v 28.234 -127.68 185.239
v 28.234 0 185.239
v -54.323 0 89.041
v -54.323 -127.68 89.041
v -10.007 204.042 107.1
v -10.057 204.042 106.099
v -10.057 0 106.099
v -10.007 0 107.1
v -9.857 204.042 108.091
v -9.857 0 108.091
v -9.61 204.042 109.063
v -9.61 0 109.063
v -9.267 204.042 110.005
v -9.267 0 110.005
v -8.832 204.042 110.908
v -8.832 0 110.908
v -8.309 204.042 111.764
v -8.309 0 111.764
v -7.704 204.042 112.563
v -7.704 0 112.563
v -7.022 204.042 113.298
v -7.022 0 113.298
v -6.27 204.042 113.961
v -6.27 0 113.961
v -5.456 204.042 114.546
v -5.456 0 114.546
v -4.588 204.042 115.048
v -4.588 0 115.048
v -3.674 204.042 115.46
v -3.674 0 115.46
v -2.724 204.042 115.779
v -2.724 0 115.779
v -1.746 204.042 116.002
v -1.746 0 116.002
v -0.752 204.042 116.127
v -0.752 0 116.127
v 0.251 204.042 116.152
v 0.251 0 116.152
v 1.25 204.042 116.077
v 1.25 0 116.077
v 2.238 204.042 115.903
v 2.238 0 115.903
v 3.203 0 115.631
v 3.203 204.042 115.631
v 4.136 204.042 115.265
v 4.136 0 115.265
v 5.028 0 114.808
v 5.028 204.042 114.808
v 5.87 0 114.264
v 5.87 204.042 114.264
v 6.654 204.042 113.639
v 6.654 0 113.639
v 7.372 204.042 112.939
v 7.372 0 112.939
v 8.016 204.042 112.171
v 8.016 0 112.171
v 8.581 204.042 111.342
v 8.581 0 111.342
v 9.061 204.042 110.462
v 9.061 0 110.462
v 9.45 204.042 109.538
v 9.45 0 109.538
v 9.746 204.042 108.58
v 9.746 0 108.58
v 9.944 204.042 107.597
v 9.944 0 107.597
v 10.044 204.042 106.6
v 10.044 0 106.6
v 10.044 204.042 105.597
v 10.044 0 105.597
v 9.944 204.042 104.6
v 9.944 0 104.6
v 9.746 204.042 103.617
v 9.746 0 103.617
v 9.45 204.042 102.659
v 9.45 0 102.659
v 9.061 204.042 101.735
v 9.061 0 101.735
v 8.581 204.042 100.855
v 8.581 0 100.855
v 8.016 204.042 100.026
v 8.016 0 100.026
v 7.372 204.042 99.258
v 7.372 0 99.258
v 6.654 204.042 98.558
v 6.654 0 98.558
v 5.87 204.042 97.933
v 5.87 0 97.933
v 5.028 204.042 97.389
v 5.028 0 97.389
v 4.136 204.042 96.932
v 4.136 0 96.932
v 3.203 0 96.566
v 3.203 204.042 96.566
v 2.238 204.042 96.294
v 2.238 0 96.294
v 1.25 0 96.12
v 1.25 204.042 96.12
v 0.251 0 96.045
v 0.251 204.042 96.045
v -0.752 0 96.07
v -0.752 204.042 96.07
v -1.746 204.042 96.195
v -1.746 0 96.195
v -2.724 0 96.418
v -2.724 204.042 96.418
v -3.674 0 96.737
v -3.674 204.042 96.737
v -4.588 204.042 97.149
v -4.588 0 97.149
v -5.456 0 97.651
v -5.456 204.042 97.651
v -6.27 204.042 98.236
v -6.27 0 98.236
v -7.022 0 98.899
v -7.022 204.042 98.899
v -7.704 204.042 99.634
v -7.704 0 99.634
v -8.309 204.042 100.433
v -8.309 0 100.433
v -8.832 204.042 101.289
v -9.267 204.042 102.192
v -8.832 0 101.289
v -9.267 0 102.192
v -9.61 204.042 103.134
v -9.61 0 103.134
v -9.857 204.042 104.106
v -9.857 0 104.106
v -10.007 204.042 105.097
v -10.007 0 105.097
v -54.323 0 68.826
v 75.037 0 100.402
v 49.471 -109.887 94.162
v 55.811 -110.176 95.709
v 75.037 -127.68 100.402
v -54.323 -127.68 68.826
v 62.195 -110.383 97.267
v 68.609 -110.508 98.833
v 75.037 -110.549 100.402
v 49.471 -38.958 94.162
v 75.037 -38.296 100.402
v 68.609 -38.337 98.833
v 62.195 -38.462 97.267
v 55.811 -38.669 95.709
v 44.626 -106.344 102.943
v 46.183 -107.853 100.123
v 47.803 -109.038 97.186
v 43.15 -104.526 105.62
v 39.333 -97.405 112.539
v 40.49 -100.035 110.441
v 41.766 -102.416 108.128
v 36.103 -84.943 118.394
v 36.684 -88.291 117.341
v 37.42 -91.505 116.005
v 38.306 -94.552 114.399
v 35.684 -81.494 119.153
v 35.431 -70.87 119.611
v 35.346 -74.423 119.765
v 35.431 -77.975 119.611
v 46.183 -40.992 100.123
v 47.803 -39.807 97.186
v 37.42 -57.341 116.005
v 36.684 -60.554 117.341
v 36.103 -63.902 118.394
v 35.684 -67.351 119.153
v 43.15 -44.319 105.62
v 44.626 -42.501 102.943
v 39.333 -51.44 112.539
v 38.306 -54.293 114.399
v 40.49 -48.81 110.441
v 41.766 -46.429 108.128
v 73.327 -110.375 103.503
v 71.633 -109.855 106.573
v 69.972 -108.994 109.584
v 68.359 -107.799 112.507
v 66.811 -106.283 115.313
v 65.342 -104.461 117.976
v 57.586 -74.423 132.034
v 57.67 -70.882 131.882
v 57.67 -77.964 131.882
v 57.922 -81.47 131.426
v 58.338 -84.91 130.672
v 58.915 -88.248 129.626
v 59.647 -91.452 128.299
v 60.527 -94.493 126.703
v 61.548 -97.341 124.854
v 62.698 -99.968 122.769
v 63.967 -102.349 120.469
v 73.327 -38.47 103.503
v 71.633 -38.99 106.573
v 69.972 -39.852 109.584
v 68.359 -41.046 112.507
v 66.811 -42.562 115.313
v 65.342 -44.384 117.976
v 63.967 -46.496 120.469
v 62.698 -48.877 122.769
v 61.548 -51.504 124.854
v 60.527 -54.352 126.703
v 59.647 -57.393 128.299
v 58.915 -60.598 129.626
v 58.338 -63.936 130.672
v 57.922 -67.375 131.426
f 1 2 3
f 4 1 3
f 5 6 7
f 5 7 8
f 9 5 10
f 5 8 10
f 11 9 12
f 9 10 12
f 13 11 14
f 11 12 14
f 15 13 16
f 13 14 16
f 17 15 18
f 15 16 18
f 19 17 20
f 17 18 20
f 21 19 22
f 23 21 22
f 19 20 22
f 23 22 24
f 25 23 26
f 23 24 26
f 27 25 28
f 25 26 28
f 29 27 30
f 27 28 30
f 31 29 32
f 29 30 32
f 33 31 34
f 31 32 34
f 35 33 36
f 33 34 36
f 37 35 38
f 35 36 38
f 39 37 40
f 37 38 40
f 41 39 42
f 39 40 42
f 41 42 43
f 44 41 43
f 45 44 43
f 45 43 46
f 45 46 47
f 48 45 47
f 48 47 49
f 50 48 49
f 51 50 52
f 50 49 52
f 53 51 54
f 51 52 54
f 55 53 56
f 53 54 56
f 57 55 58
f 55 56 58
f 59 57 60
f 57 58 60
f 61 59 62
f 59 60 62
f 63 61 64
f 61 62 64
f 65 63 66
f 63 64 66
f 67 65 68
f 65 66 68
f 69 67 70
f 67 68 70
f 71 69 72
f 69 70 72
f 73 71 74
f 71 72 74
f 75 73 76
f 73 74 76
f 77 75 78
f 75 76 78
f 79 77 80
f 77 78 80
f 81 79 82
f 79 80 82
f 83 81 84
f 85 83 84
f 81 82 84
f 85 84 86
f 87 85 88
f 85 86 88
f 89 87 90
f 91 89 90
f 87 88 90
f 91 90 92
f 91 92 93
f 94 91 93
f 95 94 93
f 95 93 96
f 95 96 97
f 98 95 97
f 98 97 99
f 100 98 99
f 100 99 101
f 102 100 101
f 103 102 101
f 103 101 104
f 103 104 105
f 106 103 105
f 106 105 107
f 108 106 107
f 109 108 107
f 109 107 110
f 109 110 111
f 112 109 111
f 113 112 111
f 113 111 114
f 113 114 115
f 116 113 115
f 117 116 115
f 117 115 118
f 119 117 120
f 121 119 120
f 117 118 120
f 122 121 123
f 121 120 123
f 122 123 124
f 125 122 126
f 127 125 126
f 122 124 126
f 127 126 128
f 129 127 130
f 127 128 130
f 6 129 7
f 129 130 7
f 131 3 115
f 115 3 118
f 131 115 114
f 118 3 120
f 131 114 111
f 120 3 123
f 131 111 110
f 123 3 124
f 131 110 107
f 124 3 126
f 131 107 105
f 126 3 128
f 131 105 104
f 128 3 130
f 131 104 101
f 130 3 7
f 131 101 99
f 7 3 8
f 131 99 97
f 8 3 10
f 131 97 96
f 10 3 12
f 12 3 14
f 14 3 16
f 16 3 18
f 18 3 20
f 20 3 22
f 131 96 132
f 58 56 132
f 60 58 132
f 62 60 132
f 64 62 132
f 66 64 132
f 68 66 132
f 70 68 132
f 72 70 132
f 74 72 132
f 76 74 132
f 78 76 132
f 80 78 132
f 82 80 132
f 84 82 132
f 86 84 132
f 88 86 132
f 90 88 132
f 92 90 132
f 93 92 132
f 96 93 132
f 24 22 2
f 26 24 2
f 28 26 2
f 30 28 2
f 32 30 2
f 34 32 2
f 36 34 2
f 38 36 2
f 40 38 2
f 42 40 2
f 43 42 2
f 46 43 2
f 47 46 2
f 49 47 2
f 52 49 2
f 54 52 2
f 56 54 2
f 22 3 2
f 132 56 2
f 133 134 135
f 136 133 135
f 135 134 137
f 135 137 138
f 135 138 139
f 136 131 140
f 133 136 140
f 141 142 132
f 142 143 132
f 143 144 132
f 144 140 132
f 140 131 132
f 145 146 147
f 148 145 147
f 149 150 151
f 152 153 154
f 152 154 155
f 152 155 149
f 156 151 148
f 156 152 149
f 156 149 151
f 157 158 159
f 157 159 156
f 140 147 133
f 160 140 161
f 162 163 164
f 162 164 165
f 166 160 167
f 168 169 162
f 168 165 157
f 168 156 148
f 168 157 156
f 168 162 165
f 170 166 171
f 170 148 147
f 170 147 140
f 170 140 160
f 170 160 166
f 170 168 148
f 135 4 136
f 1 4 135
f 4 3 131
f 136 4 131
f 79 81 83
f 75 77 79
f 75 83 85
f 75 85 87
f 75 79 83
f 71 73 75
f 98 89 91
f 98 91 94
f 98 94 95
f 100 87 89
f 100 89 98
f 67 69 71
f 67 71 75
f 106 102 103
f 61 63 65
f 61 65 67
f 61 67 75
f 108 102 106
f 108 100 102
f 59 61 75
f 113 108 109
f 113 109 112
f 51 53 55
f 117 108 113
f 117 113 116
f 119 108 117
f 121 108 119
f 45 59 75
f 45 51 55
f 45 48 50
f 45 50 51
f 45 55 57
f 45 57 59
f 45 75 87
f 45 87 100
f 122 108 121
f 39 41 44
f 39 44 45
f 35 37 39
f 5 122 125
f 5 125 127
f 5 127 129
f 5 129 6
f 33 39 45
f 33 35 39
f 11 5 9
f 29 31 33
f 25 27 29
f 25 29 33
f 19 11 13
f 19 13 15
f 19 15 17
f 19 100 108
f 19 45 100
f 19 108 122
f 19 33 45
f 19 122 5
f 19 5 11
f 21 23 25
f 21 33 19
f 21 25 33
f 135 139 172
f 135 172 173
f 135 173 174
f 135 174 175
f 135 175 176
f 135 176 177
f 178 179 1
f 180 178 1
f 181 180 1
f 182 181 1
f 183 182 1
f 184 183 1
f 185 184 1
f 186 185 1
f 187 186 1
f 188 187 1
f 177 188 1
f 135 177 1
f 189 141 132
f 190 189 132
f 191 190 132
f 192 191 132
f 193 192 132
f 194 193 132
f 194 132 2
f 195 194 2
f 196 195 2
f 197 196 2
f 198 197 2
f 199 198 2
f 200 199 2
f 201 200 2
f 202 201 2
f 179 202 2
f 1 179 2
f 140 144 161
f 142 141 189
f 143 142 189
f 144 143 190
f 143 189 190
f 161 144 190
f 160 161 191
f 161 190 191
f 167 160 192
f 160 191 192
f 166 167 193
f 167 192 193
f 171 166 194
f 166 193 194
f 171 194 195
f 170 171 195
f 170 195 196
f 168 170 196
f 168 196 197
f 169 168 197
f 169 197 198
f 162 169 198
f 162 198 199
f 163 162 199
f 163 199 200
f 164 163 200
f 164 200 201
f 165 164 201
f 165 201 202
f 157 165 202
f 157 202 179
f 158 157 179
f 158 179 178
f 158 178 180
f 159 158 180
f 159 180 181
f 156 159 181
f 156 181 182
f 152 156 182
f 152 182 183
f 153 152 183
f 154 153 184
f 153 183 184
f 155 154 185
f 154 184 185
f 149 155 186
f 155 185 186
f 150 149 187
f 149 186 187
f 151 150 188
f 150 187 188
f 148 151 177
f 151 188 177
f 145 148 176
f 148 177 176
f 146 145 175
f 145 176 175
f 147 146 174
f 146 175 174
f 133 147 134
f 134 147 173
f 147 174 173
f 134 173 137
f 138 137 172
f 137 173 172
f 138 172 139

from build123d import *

# Parameters (mm, degrees)
F1_DEPTH = 127.6796478778
F2_R     = 10.0565925357
F3_DEPTH = 204.0422167629
F4_R     = 36.1265659612
F5_DEPTH = 25.4


with BuildPart() as f1:
    # F0 (on Front) → F1 (new body)
    with BuildSketch(Plane.XZ):
        Polygon((28.2338894904, 185.2392554283), (-54.3228834867, 89.0406146646), (-54.3228834867, 68.8263475895), (75.0374570489, 100.4021242261), align=None)
    extrude(amount=F1_DEPTH)

    # F2 (on face) → F3 (join)
    with BuildSketch(Plane(origin=(0, 0, 0), x_dir=(-1, 0, 0), z_dir=(0, 1, 0))):
        with Locations((0, 106.0985550284)):
            Circle(F2_R)
    extrude(amount=F3_DEPTH)

    # F4 (on face) → F5 (cut)
    with BuildSketch(Plane(origin=(99.9939788149, 0, 55.1654078419), x_dir=(0, 1, 0), z_dir=(0.8755913279, 0, 0.4830526126))):
        with Locations((-74.4225531816, 51.6641896083)):
            Circle(F4_R)
    extrude(amount=-F5_DEPTH, mode=Mode.SUBTRACT)


solid = f1.part
